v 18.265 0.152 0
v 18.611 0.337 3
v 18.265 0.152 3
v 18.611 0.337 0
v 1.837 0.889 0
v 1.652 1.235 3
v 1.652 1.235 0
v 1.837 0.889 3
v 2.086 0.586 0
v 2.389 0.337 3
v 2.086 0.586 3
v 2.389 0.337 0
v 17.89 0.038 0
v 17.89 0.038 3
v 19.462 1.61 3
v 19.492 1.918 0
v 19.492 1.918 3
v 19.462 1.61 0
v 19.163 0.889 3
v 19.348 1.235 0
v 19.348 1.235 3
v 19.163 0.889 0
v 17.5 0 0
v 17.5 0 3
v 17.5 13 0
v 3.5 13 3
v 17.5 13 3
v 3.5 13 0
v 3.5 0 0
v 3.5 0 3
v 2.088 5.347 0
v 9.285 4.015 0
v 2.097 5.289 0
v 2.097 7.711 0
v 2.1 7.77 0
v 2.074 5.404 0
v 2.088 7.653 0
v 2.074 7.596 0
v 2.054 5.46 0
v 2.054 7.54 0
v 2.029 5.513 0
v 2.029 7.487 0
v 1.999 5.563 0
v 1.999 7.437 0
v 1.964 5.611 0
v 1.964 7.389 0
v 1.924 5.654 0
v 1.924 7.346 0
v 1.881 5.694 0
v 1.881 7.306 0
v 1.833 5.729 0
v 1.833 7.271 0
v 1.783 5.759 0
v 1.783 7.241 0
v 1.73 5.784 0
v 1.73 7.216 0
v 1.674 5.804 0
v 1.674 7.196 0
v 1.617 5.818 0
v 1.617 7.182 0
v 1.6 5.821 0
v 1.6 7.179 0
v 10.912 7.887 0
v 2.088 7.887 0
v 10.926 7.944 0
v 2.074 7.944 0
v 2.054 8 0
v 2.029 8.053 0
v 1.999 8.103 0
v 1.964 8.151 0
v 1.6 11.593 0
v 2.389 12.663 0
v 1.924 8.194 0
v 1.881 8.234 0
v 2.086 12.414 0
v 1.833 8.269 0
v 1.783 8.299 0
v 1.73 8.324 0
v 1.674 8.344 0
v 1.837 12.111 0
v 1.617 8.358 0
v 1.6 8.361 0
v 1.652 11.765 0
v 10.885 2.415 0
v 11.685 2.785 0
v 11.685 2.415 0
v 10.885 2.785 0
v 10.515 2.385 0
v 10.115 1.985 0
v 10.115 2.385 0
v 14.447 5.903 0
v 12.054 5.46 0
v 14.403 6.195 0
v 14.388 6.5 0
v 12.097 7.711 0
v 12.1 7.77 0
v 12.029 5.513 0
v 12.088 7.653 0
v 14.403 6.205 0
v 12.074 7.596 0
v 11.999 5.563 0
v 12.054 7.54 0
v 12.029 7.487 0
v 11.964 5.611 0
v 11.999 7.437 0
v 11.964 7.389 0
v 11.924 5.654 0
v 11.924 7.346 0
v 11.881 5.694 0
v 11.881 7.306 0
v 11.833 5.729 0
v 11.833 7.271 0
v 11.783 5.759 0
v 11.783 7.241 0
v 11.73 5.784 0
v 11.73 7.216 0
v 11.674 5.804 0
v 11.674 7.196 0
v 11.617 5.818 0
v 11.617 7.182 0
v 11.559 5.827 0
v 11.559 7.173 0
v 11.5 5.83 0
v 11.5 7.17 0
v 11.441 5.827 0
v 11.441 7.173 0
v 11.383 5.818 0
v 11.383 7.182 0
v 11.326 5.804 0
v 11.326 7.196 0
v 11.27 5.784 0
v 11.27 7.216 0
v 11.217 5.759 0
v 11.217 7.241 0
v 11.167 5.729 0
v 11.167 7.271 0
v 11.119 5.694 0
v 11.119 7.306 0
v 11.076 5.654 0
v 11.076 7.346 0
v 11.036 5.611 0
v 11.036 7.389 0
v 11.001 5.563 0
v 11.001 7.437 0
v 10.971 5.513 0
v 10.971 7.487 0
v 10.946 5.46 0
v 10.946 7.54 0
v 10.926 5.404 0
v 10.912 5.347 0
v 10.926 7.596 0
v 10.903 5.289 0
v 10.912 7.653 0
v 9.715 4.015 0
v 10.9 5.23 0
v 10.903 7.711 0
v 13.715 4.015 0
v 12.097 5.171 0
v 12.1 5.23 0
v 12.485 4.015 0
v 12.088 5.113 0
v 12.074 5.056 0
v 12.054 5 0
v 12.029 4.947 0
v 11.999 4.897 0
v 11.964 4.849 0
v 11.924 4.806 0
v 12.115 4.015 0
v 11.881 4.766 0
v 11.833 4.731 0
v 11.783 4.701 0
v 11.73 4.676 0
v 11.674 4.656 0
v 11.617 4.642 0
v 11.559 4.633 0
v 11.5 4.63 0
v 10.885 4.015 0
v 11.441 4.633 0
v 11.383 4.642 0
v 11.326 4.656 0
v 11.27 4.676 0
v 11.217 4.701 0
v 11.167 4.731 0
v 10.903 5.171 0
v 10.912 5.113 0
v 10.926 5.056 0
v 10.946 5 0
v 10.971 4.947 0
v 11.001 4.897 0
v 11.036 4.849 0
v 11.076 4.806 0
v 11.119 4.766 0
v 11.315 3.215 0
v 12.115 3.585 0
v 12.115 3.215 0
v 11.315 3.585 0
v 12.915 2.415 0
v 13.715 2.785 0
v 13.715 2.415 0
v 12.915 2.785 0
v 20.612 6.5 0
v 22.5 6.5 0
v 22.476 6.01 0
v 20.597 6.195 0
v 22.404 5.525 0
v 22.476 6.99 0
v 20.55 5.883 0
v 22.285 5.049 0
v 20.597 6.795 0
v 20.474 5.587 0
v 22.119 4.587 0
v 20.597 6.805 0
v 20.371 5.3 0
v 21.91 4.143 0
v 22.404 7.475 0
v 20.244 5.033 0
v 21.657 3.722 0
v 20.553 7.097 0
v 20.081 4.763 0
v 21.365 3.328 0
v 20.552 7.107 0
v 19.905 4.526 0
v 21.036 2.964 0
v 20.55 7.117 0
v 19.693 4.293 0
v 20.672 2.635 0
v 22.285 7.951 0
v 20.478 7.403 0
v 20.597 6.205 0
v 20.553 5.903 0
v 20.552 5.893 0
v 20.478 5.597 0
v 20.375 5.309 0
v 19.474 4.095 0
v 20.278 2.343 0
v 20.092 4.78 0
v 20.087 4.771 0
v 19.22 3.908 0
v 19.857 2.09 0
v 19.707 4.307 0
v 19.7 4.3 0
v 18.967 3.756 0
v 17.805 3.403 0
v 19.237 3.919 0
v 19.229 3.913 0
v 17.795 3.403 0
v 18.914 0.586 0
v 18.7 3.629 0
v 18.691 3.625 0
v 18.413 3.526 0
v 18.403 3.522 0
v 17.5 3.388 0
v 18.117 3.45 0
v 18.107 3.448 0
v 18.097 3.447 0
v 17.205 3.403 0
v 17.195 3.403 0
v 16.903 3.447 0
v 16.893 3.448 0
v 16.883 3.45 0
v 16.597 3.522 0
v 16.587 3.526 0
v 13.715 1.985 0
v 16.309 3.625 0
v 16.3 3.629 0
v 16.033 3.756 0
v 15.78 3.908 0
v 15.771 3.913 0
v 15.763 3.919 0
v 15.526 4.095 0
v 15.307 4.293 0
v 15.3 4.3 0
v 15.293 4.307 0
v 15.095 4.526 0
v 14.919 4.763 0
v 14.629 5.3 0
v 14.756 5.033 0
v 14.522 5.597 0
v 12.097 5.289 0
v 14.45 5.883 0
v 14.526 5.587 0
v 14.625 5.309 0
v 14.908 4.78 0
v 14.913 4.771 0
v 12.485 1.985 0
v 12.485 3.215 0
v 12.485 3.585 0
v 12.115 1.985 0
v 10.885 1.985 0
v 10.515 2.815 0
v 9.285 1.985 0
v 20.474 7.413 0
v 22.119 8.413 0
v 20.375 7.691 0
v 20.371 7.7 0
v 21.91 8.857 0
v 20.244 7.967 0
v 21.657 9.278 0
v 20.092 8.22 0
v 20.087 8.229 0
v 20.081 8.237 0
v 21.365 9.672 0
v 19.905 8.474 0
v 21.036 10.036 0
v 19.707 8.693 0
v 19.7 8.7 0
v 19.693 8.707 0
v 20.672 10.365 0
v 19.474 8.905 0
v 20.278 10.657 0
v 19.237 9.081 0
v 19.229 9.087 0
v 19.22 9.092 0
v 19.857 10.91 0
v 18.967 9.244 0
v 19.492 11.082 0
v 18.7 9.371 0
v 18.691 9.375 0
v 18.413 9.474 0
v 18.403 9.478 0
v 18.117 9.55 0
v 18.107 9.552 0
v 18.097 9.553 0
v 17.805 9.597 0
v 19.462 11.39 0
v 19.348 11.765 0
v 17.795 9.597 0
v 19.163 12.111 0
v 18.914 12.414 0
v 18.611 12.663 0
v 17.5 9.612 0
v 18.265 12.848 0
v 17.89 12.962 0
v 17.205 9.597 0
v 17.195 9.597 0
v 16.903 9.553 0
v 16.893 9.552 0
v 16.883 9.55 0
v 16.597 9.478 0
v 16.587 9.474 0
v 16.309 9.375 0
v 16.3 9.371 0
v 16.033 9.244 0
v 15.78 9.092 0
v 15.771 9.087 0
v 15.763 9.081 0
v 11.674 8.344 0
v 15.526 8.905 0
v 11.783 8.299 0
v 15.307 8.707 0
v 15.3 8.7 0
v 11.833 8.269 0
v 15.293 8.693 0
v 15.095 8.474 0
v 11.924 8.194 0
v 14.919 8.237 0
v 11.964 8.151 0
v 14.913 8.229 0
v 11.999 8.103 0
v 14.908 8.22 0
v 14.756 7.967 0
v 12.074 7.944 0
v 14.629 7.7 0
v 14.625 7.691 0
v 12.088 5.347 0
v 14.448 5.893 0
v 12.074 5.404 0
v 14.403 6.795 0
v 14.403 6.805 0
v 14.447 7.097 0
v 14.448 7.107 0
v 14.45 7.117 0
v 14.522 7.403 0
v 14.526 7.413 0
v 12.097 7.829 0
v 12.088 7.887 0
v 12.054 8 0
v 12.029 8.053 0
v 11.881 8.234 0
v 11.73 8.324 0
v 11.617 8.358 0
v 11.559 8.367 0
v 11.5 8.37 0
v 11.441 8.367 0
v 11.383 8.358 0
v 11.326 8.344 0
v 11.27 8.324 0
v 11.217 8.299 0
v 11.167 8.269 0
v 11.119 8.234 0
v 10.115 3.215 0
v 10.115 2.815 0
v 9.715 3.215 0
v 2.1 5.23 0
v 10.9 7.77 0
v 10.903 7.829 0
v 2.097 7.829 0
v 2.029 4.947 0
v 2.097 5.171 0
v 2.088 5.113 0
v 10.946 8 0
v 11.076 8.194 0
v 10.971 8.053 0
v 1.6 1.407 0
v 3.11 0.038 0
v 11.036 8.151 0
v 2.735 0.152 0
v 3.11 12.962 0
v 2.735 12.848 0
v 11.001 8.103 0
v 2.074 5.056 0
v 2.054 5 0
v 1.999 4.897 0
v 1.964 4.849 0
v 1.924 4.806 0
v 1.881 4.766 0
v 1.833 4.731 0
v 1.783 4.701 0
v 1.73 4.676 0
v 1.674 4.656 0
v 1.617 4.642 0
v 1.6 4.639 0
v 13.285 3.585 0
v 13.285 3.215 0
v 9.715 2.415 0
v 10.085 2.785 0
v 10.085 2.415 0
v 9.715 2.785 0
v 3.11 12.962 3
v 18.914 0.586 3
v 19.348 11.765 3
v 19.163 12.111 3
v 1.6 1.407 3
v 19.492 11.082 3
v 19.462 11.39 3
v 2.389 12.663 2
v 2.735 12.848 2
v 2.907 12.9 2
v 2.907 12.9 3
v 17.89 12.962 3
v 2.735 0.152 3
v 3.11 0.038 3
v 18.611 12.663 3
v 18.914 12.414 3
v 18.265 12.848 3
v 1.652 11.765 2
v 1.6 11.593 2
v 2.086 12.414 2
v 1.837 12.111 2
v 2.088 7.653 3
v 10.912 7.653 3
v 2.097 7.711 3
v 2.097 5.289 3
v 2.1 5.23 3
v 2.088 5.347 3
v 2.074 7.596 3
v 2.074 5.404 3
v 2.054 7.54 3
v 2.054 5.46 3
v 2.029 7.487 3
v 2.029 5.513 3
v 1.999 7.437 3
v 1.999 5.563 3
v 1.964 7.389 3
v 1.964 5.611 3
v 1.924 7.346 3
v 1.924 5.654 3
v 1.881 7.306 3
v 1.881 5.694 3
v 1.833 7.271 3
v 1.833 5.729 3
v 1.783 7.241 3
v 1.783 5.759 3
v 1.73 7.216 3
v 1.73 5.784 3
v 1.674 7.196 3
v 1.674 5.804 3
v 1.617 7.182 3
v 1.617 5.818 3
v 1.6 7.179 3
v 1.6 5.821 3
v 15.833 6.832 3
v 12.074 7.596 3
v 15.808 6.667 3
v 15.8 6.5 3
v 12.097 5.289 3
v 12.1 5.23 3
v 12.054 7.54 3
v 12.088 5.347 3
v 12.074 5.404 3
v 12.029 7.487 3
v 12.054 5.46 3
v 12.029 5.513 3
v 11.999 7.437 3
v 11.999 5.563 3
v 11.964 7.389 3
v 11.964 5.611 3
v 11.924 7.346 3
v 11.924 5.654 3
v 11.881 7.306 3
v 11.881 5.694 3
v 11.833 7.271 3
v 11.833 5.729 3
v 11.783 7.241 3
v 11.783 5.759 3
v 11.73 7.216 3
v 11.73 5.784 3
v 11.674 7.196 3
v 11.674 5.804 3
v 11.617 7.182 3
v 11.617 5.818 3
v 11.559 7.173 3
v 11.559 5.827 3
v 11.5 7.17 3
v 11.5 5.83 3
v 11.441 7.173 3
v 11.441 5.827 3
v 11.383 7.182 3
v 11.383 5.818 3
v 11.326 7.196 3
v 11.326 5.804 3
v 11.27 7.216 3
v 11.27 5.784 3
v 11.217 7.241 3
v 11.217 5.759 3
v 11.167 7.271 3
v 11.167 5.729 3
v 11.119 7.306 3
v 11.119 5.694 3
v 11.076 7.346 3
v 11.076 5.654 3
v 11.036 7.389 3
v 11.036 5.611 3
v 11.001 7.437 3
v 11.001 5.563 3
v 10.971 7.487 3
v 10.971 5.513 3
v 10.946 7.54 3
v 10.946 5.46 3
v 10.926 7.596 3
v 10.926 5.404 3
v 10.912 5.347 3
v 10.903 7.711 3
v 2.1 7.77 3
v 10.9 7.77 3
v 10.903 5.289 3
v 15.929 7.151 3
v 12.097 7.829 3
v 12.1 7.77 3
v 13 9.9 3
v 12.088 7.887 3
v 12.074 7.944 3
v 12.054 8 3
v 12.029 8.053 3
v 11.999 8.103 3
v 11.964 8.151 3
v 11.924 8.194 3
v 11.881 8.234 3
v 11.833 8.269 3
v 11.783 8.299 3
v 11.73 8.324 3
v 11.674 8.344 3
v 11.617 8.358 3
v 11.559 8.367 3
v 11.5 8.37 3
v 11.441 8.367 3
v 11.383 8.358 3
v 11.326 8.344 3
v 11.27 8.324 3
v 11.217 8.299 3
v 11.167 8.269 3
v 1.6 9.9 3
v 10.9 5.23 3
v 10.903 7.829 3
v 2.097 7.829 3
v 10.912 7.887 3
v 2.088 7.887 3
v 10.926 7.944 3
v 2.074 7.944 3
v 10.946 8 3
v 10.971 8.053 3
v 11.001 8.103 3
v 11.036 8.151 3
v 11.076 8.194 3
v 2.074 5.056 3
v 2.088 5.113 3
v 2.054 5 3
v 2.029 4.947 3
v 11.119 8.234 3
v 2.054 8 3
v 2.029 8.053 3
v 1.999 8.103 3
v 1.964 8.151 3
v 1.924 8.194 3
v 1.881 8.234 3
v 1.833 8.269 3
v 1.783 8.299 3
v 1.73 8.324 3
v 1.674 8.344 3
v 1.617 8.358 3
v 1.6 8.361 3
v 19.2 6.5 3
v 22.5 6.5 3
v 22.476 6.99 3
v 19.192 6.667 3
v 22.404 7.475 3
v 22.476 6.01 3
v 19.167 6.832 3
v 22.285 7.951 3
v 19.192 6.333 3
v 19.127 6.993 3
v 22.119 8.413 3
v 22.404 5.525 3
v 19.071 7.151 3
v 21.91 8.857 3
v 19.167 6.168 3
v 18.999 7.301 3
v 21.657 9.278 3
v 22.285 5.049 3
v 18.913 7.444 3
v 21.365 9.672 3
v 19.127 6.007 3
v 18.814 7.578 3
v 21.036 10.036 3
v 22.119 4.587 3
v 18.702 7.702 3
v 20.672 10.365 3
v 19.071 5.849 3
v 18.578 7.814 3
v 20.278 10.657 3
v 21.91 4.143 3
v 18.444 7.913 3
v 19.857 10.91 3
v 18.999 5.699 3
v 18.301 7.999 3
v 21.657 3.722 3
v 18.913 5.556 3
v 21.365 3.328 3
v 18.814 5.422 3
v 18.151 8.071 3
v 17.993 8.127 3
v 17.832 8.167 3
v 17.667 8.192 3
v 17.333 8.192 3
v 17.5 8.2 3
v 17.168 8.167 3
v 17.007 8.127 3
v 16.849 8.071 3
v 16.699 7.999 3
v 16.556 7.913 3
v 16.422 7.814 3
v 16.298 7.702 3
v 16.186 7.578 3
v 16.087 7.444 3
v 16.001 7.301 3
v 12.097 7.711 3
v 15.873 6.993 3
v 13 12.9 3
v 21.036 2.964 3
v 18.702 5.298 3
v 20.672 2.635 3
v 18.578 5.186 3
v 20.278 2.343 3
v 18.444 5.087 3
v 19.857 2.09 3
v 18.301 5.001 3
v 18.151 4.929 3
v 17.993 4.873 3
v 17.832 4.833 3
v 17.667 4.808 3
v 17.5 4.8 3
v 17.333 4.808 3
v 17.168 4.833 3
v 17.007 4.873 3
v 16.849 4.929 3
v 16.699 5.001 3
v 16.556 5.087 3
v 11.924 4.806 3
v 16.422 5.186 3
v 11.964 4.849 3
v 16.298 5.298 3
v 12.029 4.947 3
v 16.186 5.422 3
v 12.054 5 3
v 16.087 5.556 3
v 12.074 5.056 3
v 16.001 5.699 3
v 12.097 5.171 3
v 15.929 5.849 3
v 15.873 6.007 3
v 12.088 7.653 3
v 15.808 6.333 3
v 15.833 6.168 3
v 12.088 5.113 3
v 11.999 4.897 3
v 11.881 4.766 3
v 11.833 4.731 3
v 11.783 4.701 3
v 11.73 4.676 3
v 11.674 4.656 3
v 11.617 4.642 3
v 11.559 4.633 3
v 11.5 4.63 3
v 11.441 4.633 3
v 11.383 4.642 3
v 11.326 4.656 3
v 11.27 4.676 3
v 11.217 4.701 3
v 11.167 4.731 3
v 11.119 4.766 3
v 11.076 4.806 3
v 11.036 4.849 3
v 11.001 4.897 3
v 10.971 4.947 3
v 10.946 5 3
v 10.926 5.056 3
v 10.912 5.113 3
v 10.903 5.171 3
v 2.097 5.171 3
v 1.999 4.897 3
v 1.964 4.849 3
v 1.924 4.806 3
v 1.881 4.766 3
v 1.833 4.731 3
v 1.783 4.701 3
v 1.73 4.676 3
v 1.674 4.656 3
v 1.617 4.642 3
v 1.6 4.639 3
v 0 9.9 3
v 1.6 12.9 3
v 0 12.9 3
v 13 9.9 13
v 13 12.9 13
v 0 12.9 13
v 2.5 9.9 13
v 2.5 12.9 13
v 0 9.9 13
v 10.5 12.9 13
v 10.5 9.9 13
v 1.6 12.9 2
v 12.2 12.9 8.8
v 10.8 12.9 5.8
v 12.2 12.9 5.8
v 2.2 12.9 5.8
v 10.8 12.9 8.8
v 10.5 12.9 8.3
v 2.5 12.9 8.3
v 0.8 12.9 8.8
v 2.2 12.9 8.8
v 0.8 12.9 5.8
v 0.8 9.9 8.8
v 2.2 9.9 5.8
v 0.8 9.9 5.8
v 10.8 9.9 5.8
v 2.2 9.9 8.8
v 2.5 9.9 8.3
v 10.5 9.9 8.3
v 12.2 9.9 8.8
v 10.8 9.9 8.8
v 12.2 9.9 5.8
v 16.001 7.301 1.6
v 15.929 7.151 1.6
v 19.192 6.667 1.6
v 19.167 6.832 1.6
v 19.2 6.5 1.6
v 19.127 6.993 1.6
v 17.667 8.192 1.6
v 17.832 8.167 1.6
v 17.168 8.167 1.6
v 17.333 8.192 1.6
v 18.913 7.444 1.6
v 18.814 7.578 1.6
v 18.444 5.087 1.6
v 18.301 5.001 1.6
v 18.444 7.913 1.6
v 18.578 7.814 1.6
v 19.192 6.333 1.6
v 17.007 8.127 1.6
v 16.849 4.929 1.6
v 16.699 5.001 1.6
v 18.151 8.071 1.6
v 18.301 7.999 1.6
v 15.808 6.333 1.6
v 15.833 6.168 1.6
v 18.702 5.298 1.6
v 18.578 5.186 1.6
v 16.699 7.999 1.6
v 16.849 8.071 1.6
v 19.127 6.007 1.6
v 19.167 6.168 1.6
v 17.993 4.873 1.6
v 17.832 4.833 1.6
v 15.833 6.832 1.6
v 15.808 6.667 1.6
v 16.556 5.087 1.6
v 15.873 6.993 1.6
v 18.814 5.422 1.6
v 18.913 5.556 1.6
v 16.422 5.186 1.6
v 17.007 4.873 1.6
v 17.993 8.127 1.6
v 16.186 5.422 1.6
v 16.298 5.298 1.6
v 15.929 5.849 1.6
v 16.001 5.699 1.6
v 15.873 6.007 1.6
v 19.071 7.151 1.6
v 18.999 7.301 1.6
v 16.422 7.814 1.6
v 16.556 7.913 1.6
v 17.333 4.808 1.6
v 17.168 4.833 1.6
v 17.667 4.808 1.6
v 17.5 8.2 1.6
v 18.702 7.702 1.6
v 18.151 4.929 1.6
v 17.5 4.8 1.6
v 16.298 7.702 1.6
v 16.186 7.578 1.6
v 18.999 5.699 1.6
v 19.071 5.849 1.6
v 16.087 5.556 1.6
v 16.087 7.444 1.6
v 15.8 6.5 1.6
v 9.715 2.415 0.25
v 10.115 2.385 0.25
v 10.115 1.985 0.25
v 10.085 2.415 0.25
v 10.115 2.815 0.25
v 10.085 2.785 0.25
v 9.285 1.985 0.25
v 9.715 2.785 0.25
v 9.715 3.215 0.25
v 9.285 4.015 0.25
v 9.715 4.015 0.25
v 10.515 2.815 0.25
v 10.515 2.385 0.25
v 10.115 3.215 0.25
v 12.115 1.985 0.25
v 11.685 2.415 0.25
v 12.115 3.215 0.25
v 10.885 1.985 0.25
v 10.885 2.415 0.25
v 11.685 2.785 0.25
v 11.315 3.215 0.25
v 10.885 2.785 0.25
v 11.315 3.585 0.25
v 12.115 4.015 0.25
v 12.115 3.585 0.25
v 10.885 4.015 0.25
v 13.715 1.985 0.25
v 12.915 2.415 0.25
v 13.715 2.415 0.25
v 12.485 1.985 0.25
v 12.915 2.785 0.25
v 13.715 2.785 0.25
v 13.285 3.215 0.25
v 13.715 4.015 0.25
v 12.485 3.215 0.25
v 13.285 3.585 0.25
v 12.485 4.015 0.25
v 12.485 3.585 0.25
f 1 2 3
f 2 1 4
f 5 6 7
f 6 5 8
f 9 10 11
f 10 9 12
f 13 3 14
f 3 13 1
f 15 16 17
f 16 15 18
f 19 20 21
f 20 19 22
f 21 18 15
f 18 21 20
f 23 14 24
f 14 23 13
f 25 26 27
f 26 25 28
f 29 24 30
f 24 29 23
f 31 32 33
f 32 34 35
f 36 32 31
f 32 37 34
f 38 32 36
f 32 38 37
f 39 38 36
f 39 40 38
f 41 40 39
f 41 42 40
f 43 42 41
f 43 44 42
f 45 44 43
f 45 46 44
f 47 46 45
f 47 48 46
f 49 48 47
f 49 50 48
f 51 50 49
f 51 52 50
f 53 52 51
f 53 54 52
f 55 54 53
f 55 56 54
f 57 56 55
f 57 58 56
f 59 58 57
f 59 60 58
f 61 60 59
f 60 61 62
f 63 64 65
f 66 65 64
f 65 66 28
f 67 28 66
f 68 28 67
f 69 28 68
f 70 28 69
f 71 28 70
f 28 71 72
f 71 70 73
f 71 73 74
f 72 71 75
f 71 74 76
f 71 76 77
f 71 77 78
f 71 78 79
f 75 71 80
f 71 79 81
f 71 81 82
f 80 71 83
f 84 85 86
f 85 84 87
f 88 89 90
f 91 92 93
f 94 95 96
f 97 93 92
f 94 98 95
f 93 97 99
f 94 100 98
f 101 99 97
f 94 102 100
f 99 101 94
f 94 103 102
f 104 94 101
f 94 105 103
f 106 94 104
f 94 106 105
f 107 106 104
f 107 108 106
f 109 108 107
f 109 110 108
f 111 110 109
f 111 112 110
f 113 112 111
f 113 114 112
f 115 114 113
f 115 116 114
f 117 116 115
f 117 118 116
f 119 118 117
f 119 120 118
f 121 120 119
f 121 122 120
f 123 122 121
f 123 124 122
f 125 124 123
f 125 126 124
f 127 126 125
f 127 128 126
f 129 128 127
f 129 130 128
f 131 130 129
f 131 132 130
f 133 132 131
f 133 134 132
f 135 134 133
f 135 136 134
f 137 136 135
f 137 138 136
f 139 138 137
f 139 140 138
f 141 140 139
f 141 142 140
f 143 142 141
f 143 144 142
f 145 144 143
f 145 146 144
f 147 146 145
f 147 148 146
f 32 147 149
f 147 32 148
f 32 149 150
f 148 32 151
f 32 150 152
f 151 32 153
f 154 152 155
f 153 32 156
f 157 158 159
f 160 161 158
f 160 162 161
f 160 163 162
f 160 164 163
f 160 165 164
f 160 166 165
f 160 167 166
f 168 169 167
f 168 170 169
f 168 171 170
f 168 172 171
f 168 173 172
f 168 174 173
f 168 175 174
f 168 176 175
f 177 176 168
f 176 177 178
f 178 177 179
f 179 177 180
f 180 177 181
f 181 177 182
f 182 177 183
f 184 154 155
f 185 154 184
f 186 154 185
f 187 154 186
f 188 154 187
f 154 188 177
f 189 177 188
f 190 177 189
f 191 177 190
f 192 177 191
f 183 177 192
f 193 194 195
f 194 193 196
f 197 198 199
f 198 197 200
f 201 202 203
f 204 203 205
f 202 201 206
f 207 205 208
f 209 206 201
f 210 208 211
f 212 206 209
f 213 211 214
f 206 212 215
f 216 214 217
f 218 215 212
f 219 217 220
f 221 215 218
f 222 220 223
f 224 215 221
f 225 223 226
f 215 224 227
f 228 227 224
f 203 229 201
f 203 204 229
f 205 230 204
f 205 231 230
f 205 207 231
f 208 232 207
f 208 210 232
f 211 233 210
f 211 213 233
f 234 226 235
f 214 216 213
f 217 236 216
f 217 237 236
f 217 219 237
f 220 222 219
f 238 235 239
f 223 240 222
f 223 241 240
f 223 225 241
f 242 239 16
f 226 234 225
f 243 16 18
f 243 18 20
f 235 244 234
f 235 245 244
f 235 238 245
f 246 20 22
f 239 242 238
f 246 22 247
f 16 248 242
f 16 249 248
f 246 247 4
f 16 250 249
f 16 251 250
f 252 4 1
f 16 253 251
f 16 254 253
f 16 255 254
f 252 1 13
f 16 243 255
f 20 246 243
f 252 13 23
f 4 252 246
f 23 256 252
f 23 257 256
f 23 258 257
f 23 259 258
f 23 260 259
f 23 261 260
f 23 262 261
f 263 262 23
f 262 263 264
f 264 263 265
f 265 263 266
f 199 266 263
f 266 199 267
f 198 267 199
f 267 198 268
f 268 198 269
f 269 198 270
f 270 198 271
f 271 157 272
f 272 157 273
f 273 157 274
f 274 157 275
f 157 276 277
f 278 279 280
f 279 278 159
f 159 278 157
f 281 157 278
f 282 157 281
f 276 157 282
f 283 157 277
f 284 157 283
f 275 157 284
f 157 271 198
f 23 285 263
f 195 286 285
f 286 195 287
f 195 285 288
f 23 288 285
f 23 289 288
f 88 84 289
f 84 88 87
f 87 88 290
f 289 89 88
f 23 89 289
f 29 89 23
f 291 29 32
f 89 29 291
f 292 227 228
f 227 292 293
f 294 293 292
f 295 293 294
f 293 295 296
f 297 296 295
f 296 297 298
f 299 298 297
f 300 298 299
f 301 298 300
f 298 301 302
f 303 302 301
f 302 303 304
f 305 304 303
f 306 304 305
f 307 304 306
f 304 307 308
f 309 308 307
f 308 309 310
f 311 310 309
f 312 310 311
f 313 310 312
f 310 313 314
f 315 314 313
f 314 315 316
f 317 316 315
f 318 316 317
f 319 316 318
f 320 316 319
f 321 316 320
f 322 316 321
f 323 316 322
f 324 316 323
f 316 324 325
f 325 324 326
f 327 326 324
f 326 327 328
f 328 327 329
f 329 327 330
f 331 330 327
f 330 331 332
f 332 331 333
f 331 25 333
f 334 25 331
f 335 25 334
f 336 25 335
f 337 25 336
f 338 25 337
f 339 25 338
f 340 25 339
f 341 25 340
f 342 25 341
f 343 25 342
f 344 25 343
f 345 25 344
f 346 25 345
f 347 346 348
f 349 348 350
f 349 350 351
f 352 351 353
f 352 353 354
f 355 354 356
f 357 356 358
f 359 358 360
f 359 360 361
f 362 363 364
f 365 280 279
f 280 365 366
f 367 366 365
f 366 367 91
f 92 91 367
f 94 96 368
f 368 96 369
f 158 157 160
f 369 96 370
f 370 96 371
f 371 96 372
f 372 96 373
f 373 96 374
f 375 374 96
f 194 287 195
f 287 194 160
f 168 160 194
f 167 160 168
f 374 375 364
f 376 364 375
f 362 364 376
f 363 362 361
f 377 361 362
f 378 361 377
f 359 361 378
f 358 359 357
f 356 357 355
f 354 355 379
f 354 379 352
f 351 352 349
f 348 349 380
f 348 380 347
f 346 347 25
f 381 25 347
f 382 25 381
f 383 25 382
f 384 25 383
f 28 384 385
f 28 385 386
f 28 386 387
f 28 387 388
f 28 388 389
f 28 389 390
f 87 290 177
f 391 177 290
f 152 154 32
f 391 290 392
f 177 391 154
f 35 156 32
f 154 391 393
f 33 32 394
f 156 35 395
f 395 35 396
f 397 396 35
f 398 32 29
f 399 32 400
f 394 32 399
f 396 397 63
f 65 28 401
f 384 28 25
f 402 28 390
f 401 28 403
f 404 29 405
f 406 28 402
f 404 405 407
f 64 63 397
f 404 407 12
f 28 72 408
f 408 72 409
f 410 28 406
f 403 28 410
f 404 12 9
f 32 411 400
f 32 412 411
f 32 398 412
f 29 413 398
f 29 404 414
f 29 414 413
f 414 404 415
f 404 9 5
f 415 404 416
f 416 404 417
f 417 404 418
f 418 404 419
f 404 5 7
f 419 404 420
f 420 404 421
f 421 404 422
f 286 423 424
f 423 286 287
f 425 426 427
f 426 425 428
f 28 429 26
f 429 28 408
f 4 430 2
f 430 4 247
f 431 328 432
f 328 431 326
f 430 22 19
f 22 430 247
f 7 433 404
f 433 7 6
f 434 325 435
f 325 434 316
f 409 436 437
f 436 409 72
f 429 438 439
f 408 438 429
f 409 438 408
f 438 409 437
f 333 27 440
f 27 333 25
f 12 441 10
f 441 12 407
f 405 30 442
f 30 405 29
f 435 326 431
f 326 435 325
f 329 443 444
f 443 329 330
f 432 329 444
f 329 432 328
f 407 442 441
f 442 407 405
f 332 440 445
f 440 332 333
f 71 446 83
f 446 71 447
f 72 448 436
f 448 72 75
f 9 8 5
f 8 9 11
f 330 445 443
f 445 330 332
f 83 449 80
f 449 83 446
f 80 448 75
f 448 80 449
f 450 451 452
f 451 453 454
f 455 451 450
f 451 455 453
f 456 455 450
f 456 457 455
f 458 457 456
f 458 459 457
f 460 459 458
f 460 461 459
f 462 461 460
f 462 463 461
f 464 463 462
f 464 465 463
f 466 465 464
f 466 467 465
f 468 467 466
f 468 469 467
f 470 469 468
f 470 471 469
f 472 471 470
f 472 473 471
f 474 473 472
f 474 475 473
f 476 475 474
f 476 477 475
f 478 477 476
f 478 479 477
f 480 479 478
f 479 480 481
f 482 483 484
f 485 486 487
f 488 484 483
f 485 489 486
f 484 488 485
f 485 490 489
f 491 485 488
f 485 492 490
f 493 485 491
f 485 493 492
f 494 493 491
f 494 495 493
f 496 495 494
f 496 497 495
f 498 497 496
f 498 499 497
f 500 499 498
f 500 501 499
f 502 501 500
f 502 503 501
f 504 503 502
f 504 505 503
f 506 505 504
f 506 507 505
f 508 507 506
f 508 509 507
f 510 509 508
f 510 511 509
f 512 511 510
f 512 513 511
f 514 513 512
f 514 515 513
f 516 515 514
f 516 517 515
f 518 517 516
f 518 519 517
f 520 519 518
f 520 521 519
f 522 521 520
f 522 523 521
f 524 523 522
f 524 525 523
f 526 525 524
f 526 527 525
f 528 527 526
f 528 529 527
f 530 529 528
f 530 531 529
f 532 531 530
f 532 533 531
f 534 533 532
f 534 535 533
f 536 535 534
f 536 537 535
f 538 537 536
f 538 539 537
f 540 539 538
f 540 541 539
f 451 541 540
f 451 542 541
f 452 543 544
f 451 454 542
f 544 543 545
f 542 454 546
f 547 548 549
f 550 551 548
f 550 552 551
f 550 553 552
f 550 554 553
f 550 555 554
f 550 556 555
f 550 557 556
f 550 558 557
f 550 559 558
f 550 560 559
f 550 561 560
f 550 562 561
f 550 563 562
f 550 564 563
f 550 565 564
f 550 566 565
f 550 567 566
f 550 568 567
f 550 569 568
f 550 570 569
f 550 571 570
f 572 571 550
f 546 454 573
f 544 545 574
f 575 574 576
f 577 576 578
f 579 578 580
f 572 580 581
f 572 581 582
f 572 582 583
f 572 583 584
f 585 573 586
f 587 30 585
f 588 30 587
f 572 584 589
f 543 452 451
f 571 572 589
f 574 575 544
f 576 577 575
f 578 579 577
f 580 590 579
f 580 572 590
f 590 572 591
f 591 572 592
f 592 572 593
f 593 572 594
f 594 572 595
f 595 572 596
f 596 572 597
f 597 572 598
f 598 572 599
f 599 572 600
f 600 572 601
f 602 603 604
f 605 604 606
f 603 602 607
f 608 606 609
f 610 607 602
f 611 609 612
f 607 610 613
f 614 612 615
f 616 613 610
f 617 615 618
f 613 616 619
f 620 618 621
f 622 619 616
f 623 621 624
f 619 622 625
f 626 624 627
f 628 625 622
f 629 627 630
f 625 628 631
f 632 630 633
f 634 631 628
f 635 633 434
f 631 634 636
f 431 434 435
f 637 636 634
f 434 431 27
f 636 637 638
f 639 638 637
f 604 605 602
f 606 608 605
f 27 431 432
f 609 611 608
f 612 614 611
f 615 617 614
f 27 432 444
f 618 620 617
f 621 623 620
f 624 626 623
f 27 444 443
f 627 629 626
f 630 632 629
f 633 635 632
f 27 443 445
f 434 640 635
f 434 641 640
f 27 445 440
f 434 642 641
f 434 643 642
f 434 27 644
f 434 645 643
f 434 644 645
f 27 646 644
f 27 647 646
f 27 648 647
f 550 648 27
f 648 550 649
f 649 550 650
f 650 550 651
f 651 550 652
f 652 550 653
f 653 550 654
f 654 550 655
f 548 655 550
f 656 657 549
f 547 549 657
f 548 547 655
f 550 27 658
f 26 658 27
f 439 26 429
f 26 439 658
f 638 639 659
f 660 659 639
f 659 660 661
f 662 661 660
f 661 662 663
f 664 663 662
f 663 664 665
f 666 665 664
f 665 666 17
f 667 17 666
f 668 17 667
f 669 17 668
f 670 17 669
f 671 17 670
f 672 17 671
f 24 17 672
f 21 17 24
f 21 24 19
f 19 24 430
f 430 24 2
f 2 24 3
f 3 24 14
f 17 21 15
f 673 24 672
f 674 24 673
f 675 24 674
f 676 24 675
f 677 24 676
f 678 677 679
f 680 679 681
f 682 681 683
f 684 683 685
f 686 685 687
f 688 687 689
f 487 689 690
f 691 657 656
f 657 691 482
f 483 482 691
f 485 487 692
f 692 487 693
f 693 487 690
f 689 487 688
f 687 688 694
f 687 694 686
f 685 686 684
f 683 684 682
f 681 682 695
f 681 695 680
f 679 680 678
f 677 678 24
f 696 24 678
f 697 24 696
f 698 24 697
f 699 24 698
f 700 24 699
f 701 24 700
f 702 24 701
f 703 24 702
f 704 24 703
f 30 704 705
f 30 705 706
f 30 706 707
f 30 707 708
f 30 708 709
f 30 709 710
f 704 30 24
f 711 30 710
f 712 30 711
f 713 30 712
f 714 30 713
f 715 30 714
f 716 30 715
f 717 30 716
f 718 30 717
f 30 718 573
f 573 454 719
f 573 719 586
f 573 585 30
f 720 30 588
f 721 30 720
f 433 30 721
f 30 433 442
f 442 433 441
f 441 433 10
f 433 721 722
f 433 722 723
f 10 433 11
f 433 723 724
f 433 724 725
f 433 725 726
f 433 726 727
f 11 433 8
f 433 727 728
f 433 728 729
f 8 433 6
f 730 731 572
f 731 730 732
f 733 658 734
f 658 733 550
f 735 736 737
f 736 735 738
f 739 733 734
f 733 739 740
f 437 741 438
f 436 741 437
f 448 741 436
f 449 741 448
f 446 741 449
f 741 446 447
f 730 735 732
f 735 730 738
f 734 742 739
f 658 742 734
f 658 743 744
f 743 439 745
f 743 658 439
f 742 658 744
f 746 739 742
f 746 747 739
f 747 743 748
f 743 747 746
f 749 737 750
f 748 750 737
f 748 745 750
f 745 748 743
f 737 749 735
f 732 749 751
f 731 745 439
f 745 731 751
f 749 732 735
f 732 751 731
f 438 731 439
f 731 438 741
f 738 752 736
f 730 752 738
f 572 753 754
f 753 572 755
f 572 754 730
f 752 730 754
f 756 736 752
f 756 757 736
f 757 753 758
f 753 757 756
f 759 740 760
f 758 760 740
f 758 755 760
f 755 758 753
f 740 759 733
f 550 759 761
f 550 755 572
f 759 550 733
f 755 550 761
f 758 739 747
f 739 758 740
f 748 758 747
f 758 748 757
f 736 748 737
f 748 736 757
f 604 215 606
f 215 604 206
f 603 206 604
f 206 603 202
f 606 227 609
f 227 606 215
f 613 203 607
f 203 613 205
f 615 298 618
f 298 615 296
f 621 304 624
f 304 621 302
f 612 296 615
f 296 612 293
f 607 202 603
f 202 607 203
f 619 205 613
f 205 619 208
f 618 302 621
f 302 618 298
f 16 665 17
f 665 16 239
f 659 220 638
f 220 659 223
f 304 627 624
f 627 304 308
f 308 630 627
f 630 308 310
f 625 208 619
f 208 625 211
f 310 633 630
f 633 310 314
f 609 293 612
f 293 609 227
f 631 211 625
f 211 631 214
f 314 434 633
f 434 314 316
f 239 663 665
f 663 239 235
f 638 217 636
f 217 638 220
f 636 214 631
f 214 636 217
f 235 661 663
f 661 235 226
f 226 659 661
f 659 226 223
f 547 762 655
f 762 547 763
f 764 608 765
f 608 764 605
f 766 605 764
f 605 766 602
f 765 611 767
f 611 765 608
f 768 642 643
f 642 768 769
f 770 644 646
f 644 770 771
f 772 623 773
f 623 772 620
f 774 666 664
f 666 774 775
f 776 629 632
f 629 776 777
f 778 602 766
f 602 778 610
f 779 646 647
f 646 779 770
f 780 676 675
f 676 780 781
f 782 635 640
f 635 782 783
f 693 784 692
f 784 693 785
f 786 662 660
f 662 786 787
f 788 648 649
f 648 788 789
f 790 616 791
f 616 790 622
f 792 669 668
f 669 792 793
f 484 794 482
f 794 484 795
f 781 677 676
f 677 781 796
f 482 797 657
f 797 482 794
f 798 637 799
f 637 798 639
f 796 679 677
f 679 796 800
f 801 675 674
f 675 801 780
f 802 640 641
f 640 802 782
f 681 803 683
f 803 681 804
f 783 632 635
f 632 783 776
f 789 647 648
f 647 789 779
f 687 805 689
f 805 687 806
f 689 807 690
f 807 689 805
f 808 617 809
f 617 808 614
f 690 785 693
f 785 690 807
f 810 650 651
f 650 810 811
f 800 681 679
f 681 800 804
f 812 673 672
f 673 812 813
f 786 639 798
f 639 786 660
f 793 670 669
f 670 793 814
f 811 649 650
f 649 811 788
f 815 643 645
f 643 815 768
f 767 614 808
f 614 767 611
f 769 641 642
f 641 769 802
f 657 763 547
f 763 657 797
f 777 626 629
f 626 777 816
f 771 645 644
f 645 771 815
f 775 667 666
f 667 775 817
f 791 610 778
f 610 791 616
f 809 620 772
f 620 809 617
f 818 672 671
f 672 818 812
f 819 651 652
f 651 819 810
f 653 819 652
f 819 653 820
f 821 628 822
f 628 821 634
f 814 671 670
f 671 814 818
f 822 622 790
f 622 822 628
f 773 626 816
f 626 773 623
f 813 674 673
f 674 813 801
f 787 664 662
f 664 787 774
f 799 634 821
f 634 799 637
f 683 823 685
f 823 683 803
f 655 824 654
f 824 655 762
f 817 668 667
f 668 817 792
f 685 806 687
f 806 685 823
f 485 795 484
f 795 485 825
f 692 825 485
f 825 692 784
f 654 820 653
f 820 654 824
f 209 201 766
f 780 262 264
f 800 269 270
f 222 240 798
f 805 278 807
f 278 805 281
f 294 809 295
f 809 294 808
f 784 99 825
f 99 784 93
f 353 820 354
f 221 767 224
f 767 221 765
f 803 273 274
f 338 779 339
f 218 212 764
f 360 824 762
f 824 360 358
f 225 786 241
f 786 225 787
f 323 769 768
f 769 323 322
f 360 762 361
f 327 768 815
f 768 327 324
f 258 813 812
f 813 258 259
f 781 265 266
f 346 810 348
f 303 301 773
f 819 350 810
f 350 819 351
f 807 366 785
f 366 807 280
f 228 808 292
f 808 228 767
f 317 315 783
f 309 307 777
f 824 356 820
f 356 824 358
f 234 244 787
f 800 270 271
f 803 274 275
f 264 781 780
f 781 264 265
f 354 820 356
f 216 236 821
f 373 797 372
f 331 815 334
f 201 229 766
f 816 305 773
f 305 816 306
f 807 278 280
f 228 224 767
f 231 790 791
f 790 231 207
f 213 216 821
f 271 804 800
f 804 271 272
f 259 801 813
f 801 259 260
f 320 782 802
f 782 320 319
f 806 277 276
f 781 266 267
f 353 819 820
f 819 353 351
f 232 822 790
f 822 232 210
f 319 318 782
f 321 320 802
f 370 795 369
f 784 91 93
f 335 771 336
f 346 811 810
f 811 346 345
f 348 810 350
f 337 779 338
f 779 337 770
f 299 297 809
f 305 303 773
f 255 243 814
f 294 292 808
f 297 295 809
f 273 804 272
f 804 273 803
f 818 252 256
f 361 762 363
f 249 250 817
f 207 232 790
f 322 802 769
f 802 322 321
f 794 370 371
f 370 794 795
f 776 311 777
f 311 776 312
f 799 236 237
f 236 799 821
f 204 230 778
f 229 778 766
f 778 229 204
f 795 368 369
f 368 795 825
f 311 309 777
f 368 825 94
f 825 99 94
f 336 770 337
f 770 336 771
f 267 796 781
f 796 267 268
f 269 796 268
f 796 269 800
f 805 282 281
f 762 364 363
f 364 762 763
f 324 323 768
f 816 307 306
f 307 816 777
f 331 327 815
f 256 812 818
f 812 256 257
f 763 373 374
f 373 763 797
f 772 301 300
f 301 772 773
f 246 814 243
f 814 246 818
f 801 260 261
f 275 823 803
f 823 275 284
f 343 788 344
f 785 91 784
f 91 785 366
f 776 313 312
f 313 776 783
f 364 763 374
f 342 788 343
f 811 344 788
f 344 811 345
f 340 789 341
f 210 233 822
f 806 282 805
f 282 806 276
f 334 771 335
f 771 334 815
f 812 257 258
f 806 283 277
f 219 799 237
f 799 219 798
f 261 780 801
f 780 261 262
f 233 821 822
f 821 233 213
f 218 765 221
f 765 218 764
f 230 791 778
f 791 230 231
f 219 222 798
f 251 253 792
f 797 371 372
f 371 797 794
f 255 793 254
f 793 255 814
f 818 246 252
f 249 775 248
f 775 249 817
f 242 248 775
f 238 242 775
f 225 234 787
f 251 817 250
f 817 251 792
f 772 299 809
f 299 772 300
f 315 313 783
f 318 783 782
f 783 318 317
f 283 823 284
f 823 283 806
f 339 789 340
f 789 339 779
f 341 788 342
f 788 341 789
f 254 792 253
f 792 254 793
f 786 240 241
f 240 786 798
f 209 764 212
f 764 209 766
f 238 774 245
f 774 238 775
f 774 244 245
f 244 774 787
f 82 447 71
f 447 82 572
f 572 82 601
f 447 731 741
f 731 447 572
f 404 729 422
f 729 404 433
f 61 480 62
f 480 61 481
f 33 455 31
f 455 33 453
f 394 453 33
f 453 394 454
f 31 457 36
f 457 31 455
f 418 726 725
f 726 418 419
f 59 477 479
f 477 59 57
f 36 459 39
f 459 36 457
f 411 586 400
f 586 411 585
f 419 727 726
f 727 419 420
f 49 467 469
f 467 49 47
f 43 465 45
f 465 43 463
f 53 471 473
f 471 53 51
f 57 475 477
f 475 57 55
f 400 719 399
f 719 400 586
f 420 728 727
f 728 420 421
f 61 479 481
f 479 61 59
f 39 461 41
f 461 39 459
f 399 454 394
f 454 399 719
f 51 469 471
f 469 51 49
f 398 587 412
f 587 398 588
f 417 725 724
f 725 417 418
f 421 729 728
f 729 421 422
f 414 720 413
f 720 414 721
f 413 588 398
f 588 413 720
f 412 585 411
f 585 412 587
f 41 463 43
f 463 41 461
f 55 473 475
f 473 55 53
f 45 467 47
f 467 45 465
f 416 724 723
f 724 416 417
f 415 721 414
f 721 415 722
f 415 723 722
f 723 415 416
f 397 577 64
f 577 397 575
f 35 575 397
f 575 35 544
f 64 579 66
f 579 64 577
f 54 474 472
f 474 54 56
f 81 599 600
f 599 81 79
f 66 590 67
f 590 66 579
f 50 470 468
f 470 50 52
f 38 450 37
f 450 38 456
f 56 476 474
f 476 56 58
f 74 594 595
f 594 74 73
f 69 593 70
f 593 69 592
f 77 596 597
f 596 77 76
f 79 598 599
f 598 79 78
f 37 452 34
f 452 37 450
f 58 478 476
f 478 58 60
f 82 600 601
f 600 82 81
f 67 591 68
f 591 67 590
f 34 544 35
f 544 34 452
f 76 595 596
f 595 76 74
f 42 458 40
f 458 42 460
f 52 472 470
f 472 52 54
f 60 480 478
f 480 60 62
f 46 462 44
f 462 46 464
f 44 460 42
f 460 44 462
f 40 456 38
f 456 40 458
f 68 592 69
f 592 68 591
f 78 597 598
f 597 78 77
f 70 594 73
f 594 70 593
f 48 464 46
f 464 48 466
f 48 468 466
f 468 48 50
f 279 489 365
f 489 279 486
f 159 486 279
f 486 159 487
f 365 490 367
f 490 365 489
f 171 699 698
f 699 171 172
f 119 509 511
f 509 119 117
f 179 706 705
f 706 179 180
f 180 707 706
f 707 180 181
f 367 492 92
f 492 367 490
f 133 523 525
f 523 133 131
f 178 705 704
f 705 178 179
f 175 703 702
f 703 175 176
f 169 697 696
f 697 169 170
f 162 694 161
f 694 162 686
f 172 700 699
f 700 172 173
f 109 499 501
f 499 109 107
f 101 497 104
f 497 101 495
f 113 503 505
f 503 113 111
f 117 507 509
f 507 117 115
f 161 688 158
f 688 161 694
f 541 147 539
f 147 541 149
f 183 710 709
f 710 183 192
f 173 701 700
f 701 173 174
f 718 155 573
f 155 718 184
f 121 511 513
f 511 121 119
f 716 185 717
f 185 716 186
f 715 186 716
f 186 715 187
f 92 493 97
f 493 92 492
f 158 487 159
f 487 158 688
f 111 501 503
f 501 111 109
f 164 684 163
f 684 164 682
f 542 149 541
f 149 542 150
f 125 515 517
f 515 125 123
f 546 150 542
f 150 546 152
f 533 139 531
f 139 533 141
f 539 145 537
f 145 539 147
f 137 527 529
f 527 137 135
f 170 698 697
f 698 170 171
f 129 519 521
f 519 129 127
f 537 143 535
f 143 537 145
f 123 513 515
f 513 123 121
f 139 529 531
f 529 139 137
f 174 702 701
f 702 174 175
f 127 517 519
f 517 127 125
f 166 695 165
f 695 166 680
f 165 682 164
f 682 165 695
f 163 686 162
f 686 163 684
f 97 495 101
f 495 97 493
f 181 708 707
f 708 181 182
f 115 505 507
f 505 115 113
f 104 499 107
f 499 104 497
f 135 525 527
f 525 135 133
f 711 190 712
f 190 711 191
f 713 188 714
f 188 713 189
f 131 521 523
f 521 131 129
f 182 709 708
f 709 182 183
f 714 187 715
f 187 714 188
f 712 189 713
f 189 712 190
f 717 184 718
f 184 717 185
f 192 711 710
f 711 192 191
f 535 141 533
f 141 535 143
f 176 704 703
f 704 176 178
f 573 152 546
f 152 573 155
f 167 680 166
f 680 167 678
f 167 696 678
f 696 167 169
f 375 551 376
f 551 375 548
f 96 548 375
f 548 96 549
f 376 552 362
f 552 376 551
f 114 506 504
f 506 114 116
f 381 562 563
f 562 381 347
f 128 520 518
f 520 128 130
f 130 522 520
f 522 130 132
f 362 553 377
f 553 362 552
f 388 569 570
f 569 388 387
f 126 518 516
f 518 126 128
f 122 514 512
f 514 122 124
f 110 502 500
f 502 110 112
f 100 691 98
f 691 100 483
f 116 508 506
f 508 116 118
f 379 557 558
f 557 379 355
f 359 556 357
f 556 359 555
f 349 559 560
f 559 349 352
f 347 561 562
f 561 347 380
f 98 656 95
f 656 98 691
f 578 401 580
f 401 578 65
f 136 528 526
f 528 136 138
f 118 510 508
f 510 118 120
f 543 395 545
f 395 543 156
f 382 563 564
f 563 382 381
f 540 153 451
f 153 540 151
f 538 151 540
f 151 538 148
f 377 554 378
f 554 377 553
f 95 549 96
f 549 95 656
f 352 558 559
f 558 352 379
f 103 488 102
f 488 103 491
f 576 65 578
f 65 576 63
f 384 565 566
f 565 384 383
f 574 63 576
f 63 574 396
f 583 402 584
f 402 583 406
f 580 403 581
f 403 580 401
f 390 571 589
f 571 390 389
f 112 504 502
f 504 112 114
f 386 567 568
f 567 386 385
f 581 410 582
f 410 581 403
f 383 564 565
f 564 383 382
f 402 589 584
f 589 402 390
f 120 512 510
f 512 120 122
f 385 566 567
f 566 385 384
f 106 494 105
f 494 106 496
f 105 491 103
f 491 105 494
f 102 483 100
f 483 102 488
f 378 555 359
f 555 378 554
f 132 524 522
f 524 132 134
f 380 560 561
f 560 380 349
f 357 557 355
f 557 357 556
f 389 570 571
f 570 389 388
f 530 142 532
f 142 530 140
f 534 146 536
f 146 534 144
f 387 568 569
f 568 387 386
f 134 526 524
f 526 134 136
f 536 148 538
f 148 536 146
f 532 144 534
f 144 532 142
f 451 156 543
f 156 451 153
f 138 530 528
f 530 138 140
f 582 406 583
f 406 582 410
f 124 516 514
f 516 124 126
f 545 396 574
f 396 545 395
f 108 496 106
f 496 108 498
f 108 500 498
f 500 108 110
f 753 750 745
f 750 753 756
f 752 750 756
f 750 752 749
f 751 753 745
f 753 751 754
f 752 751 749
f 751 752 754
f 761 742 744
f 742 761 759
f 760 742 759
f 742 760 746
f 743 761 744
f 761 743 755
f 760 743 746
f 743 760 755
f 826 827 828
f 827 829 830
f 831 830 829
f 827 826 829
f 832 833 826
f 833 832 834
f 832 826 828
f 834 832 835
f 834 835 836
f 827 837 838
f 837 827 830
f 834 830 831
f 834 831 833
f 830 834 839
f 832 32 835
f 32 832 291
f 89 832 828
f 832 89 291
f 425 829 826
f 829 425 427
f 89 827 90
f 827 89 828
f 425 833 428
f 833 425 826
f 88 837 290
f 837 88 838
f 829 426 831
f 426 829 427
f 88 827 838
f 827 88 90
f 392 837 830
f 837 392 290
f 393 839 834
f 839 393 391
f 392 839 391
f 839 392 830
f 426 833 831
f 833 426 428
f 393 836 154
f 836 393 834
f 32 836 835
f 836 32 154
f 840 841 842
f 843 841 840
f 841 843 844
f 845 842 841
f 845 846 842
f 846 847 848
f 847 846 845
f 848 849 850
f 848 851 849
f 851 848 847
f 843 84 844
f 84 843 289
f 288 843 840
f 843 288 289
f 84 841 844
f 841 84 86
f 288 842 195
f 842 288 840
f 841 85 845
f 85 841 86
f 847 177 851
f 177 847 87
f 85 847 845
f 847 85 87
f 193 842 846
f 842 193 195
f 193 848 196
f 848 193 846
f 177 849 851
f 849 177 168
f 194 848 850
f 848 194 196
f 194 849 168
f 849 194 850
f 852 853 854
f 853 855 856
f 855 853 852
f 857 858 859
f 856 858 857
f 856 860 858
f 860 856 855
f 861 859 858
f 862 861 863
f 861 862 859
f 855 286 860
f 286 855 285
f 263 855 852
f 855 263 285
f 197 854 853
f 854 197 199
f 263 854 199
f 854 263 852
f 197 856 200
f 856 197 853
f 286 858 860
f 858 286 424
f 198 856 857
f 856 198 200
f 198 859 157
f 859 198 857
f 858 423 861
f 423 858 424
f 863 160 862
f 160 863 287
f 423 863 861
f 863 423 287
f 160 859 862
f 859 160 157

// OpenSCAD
// 旋轉參考光電座
$fn=64;
translate([81,-3.5,-27]){rotate([0,0,0]){difference(){difference(){difference(){difference(){difference(){difference(){difference(){difference(){difference(){difference(){union(){difference(){union(){translate([-70.5,10,0]){translate([0,0,27]){linear_extrude(height=3)polygon([[9,4.5],[8.96157,4.89018],[8.84776,5.26537],[8.66294,5.61114],[8.41421,5.91421],[8.11114,6.16294],[7.76537,6.34776],[7.39018,6.46157],[7,6.5],[-7,6.5],[-7.39018,6.46157],[-7.76537,6.34776],[-8.11114,6.16294],[-8.41421,5.91421],[-8.66294,5.61114],[-8.84776,5.26537],[-8.96157,4.89018],[-9,4.5],[-9,-4.5],[-8.96157,-4.89018],[-8.84776,-5.26537],[-8.66294,-5.61114],[-8.41421,-5.91421],[-8.11114,-6.16294],[-7.76537,-6.34776],[-7.39018,-6.46157],[-7,-6.5],[7,-6.5],[7.39018,-6.46157],[7.76537,-6.34776],[8.11114,-6.16294],[8.41421,-5.91421],[8.66294,-5.61114],[8.84776,-5.26537],[8.96157,-4.89018],[9,-4.5]]);}}translate([-81,13.4,29]){cube([13,3,11]);}}translate([-78.5,12.4,35.3]){cube([8,5,6]);}}translate([-63.5,10,27]){cylinder(h=3,d1=10,d2=10,$fn=64);}}translate([-63.5,10,26]){cylinder(h=6,d1=3.4,d2=3.4,$fn=64);}}translate([-63.5,10,26.9]){cylinder(h=1.7,d1=6.4,d2=3.4,$fn=64);}}translate([-83.4,-5,26.9]){cube([4,30,3.1]);}}translate([-79.5,8.73,26]){cylinder(h=8,d1=1.2,d2=1.2,$fn=64);}}translate([-79.5,11.27,26]){cylinder(h=8,d1=1.2,d2=1.2,$fn=64);}}translate([-69.5,8.73,26]){cylinder(h=8,d1=1.2,d2=1.2,$fn=64);}}translate([-69.5,11.27,26]){cylinder(h=8,d1=1.2,d2=1.2,$fn=64);}}translate([-80.2,10.9,32.8]){cube([1.4,8,3]);}}translate([-70.2,10.9,32.8]){cube([1.4,8,3]);}}multmatrix([[1,0,0,-69.5],[0,-1,0,6.5],[0,0,-1,27],[0,0,0,1]]){union(){union(){union(){union(){union(){union(){union(){union(){union(){union(){union(){union(){union(){union(){union(){union(){union(){union(){union(){union(){union(){union(){union(){union(){union(){union(){union(){union(){union(){translate([-2.215,0.585,-0.25]){cube([0.43,0.43,0.37]);}translate([-1.815,0.585,-0.25]){cube([0.43,0.43,0.37]);}}translate([-2.215,0.185,-0.25]){cube([0.43,0.43,0.37]);}}translate([-1.415,0.185,-0.25]){cube([0.43,0.43,0.37]);}}translate([-2.215,-0.215,-0.25]){cube([0.43,0.43,0.37]);}}translate([-1.815,-0.215,-0.25]){cube([0.43,0.43,0.37]);}}translate([-2.215,-0.615,-0.25]){cube([0.43,0.43,0.37]);}}translate([-2.215,-1.015,-0.25]){cube([0.43,0.43,0.37]);}}translate([-0.615,0.585,-0.25]){cube([0.43,0.43,0.37]);}}translate([-0.215,0.585,-0.25]){cube([0.43,0.43,0.37]);}}translate([0.185,0.585,-0.25]){cube([0.43,0.43,0.37]);}}translate([0.185,0.185,-0.25]){cube([0.43,0.43,0.37]);}}translate([-0.615,-0.215,-0.25]){cube([0.43,0.43,0.37]);}}translate([-0.215,-0.215,-0.25]){cube([0.43,0.43,0.37]);}}translate([0.185,-0.215,-0.25]){cube([0.43,0.43,0.37]);}}translate([-0.615,-0.615,-0.25]){cube([0.43,0.43,0.37]);}}translate([-0.615,-1.015,-0.25]){cube([0.43,0.43,0.37]);}}translate([-0.215,-1.015,-0.25]){cube([0.43,0.43,0.37]);}}translate([0.185,-1.015,-0.25]){cube([0.43,0.43,0.37]);}}translate([0.985,0.585,-0.25]){cube([0.43,0.43,0.37]);}}translate([1.385,0.585,-0.25]){cube([0.43,0.43,0.37]);}}translate([1.785,0.585,-0.25]){cube([0.43,0.43,0.37]);}}translate([0.985,0.185,-0.25]){cube([0.43,0.43,0.37]);}}translate([0.985,-0.215,-0.25]){cube([0.43,0.43,0.37]);}}translate([1.385,-0.215,-0.25]){cube([0.43,0.43,0.37]);}}translate([1.785,-0.215,-0.25]){cube([0.43,0.43,0.37]);}}translate([1.785,-0.615,-0.25]){cube([0.43,0.43,0.37]);}}translate([0.985,-1.015,-0.25]){cube([0.43,0.43,0.37]);}}translate([1.385,-1.015,-0.25]){cube([0.43,0.43,0.37]);}}translate([1.785,-1.015,-0.25]){cube([0.43,0.43,0.37]);}}}}}}
